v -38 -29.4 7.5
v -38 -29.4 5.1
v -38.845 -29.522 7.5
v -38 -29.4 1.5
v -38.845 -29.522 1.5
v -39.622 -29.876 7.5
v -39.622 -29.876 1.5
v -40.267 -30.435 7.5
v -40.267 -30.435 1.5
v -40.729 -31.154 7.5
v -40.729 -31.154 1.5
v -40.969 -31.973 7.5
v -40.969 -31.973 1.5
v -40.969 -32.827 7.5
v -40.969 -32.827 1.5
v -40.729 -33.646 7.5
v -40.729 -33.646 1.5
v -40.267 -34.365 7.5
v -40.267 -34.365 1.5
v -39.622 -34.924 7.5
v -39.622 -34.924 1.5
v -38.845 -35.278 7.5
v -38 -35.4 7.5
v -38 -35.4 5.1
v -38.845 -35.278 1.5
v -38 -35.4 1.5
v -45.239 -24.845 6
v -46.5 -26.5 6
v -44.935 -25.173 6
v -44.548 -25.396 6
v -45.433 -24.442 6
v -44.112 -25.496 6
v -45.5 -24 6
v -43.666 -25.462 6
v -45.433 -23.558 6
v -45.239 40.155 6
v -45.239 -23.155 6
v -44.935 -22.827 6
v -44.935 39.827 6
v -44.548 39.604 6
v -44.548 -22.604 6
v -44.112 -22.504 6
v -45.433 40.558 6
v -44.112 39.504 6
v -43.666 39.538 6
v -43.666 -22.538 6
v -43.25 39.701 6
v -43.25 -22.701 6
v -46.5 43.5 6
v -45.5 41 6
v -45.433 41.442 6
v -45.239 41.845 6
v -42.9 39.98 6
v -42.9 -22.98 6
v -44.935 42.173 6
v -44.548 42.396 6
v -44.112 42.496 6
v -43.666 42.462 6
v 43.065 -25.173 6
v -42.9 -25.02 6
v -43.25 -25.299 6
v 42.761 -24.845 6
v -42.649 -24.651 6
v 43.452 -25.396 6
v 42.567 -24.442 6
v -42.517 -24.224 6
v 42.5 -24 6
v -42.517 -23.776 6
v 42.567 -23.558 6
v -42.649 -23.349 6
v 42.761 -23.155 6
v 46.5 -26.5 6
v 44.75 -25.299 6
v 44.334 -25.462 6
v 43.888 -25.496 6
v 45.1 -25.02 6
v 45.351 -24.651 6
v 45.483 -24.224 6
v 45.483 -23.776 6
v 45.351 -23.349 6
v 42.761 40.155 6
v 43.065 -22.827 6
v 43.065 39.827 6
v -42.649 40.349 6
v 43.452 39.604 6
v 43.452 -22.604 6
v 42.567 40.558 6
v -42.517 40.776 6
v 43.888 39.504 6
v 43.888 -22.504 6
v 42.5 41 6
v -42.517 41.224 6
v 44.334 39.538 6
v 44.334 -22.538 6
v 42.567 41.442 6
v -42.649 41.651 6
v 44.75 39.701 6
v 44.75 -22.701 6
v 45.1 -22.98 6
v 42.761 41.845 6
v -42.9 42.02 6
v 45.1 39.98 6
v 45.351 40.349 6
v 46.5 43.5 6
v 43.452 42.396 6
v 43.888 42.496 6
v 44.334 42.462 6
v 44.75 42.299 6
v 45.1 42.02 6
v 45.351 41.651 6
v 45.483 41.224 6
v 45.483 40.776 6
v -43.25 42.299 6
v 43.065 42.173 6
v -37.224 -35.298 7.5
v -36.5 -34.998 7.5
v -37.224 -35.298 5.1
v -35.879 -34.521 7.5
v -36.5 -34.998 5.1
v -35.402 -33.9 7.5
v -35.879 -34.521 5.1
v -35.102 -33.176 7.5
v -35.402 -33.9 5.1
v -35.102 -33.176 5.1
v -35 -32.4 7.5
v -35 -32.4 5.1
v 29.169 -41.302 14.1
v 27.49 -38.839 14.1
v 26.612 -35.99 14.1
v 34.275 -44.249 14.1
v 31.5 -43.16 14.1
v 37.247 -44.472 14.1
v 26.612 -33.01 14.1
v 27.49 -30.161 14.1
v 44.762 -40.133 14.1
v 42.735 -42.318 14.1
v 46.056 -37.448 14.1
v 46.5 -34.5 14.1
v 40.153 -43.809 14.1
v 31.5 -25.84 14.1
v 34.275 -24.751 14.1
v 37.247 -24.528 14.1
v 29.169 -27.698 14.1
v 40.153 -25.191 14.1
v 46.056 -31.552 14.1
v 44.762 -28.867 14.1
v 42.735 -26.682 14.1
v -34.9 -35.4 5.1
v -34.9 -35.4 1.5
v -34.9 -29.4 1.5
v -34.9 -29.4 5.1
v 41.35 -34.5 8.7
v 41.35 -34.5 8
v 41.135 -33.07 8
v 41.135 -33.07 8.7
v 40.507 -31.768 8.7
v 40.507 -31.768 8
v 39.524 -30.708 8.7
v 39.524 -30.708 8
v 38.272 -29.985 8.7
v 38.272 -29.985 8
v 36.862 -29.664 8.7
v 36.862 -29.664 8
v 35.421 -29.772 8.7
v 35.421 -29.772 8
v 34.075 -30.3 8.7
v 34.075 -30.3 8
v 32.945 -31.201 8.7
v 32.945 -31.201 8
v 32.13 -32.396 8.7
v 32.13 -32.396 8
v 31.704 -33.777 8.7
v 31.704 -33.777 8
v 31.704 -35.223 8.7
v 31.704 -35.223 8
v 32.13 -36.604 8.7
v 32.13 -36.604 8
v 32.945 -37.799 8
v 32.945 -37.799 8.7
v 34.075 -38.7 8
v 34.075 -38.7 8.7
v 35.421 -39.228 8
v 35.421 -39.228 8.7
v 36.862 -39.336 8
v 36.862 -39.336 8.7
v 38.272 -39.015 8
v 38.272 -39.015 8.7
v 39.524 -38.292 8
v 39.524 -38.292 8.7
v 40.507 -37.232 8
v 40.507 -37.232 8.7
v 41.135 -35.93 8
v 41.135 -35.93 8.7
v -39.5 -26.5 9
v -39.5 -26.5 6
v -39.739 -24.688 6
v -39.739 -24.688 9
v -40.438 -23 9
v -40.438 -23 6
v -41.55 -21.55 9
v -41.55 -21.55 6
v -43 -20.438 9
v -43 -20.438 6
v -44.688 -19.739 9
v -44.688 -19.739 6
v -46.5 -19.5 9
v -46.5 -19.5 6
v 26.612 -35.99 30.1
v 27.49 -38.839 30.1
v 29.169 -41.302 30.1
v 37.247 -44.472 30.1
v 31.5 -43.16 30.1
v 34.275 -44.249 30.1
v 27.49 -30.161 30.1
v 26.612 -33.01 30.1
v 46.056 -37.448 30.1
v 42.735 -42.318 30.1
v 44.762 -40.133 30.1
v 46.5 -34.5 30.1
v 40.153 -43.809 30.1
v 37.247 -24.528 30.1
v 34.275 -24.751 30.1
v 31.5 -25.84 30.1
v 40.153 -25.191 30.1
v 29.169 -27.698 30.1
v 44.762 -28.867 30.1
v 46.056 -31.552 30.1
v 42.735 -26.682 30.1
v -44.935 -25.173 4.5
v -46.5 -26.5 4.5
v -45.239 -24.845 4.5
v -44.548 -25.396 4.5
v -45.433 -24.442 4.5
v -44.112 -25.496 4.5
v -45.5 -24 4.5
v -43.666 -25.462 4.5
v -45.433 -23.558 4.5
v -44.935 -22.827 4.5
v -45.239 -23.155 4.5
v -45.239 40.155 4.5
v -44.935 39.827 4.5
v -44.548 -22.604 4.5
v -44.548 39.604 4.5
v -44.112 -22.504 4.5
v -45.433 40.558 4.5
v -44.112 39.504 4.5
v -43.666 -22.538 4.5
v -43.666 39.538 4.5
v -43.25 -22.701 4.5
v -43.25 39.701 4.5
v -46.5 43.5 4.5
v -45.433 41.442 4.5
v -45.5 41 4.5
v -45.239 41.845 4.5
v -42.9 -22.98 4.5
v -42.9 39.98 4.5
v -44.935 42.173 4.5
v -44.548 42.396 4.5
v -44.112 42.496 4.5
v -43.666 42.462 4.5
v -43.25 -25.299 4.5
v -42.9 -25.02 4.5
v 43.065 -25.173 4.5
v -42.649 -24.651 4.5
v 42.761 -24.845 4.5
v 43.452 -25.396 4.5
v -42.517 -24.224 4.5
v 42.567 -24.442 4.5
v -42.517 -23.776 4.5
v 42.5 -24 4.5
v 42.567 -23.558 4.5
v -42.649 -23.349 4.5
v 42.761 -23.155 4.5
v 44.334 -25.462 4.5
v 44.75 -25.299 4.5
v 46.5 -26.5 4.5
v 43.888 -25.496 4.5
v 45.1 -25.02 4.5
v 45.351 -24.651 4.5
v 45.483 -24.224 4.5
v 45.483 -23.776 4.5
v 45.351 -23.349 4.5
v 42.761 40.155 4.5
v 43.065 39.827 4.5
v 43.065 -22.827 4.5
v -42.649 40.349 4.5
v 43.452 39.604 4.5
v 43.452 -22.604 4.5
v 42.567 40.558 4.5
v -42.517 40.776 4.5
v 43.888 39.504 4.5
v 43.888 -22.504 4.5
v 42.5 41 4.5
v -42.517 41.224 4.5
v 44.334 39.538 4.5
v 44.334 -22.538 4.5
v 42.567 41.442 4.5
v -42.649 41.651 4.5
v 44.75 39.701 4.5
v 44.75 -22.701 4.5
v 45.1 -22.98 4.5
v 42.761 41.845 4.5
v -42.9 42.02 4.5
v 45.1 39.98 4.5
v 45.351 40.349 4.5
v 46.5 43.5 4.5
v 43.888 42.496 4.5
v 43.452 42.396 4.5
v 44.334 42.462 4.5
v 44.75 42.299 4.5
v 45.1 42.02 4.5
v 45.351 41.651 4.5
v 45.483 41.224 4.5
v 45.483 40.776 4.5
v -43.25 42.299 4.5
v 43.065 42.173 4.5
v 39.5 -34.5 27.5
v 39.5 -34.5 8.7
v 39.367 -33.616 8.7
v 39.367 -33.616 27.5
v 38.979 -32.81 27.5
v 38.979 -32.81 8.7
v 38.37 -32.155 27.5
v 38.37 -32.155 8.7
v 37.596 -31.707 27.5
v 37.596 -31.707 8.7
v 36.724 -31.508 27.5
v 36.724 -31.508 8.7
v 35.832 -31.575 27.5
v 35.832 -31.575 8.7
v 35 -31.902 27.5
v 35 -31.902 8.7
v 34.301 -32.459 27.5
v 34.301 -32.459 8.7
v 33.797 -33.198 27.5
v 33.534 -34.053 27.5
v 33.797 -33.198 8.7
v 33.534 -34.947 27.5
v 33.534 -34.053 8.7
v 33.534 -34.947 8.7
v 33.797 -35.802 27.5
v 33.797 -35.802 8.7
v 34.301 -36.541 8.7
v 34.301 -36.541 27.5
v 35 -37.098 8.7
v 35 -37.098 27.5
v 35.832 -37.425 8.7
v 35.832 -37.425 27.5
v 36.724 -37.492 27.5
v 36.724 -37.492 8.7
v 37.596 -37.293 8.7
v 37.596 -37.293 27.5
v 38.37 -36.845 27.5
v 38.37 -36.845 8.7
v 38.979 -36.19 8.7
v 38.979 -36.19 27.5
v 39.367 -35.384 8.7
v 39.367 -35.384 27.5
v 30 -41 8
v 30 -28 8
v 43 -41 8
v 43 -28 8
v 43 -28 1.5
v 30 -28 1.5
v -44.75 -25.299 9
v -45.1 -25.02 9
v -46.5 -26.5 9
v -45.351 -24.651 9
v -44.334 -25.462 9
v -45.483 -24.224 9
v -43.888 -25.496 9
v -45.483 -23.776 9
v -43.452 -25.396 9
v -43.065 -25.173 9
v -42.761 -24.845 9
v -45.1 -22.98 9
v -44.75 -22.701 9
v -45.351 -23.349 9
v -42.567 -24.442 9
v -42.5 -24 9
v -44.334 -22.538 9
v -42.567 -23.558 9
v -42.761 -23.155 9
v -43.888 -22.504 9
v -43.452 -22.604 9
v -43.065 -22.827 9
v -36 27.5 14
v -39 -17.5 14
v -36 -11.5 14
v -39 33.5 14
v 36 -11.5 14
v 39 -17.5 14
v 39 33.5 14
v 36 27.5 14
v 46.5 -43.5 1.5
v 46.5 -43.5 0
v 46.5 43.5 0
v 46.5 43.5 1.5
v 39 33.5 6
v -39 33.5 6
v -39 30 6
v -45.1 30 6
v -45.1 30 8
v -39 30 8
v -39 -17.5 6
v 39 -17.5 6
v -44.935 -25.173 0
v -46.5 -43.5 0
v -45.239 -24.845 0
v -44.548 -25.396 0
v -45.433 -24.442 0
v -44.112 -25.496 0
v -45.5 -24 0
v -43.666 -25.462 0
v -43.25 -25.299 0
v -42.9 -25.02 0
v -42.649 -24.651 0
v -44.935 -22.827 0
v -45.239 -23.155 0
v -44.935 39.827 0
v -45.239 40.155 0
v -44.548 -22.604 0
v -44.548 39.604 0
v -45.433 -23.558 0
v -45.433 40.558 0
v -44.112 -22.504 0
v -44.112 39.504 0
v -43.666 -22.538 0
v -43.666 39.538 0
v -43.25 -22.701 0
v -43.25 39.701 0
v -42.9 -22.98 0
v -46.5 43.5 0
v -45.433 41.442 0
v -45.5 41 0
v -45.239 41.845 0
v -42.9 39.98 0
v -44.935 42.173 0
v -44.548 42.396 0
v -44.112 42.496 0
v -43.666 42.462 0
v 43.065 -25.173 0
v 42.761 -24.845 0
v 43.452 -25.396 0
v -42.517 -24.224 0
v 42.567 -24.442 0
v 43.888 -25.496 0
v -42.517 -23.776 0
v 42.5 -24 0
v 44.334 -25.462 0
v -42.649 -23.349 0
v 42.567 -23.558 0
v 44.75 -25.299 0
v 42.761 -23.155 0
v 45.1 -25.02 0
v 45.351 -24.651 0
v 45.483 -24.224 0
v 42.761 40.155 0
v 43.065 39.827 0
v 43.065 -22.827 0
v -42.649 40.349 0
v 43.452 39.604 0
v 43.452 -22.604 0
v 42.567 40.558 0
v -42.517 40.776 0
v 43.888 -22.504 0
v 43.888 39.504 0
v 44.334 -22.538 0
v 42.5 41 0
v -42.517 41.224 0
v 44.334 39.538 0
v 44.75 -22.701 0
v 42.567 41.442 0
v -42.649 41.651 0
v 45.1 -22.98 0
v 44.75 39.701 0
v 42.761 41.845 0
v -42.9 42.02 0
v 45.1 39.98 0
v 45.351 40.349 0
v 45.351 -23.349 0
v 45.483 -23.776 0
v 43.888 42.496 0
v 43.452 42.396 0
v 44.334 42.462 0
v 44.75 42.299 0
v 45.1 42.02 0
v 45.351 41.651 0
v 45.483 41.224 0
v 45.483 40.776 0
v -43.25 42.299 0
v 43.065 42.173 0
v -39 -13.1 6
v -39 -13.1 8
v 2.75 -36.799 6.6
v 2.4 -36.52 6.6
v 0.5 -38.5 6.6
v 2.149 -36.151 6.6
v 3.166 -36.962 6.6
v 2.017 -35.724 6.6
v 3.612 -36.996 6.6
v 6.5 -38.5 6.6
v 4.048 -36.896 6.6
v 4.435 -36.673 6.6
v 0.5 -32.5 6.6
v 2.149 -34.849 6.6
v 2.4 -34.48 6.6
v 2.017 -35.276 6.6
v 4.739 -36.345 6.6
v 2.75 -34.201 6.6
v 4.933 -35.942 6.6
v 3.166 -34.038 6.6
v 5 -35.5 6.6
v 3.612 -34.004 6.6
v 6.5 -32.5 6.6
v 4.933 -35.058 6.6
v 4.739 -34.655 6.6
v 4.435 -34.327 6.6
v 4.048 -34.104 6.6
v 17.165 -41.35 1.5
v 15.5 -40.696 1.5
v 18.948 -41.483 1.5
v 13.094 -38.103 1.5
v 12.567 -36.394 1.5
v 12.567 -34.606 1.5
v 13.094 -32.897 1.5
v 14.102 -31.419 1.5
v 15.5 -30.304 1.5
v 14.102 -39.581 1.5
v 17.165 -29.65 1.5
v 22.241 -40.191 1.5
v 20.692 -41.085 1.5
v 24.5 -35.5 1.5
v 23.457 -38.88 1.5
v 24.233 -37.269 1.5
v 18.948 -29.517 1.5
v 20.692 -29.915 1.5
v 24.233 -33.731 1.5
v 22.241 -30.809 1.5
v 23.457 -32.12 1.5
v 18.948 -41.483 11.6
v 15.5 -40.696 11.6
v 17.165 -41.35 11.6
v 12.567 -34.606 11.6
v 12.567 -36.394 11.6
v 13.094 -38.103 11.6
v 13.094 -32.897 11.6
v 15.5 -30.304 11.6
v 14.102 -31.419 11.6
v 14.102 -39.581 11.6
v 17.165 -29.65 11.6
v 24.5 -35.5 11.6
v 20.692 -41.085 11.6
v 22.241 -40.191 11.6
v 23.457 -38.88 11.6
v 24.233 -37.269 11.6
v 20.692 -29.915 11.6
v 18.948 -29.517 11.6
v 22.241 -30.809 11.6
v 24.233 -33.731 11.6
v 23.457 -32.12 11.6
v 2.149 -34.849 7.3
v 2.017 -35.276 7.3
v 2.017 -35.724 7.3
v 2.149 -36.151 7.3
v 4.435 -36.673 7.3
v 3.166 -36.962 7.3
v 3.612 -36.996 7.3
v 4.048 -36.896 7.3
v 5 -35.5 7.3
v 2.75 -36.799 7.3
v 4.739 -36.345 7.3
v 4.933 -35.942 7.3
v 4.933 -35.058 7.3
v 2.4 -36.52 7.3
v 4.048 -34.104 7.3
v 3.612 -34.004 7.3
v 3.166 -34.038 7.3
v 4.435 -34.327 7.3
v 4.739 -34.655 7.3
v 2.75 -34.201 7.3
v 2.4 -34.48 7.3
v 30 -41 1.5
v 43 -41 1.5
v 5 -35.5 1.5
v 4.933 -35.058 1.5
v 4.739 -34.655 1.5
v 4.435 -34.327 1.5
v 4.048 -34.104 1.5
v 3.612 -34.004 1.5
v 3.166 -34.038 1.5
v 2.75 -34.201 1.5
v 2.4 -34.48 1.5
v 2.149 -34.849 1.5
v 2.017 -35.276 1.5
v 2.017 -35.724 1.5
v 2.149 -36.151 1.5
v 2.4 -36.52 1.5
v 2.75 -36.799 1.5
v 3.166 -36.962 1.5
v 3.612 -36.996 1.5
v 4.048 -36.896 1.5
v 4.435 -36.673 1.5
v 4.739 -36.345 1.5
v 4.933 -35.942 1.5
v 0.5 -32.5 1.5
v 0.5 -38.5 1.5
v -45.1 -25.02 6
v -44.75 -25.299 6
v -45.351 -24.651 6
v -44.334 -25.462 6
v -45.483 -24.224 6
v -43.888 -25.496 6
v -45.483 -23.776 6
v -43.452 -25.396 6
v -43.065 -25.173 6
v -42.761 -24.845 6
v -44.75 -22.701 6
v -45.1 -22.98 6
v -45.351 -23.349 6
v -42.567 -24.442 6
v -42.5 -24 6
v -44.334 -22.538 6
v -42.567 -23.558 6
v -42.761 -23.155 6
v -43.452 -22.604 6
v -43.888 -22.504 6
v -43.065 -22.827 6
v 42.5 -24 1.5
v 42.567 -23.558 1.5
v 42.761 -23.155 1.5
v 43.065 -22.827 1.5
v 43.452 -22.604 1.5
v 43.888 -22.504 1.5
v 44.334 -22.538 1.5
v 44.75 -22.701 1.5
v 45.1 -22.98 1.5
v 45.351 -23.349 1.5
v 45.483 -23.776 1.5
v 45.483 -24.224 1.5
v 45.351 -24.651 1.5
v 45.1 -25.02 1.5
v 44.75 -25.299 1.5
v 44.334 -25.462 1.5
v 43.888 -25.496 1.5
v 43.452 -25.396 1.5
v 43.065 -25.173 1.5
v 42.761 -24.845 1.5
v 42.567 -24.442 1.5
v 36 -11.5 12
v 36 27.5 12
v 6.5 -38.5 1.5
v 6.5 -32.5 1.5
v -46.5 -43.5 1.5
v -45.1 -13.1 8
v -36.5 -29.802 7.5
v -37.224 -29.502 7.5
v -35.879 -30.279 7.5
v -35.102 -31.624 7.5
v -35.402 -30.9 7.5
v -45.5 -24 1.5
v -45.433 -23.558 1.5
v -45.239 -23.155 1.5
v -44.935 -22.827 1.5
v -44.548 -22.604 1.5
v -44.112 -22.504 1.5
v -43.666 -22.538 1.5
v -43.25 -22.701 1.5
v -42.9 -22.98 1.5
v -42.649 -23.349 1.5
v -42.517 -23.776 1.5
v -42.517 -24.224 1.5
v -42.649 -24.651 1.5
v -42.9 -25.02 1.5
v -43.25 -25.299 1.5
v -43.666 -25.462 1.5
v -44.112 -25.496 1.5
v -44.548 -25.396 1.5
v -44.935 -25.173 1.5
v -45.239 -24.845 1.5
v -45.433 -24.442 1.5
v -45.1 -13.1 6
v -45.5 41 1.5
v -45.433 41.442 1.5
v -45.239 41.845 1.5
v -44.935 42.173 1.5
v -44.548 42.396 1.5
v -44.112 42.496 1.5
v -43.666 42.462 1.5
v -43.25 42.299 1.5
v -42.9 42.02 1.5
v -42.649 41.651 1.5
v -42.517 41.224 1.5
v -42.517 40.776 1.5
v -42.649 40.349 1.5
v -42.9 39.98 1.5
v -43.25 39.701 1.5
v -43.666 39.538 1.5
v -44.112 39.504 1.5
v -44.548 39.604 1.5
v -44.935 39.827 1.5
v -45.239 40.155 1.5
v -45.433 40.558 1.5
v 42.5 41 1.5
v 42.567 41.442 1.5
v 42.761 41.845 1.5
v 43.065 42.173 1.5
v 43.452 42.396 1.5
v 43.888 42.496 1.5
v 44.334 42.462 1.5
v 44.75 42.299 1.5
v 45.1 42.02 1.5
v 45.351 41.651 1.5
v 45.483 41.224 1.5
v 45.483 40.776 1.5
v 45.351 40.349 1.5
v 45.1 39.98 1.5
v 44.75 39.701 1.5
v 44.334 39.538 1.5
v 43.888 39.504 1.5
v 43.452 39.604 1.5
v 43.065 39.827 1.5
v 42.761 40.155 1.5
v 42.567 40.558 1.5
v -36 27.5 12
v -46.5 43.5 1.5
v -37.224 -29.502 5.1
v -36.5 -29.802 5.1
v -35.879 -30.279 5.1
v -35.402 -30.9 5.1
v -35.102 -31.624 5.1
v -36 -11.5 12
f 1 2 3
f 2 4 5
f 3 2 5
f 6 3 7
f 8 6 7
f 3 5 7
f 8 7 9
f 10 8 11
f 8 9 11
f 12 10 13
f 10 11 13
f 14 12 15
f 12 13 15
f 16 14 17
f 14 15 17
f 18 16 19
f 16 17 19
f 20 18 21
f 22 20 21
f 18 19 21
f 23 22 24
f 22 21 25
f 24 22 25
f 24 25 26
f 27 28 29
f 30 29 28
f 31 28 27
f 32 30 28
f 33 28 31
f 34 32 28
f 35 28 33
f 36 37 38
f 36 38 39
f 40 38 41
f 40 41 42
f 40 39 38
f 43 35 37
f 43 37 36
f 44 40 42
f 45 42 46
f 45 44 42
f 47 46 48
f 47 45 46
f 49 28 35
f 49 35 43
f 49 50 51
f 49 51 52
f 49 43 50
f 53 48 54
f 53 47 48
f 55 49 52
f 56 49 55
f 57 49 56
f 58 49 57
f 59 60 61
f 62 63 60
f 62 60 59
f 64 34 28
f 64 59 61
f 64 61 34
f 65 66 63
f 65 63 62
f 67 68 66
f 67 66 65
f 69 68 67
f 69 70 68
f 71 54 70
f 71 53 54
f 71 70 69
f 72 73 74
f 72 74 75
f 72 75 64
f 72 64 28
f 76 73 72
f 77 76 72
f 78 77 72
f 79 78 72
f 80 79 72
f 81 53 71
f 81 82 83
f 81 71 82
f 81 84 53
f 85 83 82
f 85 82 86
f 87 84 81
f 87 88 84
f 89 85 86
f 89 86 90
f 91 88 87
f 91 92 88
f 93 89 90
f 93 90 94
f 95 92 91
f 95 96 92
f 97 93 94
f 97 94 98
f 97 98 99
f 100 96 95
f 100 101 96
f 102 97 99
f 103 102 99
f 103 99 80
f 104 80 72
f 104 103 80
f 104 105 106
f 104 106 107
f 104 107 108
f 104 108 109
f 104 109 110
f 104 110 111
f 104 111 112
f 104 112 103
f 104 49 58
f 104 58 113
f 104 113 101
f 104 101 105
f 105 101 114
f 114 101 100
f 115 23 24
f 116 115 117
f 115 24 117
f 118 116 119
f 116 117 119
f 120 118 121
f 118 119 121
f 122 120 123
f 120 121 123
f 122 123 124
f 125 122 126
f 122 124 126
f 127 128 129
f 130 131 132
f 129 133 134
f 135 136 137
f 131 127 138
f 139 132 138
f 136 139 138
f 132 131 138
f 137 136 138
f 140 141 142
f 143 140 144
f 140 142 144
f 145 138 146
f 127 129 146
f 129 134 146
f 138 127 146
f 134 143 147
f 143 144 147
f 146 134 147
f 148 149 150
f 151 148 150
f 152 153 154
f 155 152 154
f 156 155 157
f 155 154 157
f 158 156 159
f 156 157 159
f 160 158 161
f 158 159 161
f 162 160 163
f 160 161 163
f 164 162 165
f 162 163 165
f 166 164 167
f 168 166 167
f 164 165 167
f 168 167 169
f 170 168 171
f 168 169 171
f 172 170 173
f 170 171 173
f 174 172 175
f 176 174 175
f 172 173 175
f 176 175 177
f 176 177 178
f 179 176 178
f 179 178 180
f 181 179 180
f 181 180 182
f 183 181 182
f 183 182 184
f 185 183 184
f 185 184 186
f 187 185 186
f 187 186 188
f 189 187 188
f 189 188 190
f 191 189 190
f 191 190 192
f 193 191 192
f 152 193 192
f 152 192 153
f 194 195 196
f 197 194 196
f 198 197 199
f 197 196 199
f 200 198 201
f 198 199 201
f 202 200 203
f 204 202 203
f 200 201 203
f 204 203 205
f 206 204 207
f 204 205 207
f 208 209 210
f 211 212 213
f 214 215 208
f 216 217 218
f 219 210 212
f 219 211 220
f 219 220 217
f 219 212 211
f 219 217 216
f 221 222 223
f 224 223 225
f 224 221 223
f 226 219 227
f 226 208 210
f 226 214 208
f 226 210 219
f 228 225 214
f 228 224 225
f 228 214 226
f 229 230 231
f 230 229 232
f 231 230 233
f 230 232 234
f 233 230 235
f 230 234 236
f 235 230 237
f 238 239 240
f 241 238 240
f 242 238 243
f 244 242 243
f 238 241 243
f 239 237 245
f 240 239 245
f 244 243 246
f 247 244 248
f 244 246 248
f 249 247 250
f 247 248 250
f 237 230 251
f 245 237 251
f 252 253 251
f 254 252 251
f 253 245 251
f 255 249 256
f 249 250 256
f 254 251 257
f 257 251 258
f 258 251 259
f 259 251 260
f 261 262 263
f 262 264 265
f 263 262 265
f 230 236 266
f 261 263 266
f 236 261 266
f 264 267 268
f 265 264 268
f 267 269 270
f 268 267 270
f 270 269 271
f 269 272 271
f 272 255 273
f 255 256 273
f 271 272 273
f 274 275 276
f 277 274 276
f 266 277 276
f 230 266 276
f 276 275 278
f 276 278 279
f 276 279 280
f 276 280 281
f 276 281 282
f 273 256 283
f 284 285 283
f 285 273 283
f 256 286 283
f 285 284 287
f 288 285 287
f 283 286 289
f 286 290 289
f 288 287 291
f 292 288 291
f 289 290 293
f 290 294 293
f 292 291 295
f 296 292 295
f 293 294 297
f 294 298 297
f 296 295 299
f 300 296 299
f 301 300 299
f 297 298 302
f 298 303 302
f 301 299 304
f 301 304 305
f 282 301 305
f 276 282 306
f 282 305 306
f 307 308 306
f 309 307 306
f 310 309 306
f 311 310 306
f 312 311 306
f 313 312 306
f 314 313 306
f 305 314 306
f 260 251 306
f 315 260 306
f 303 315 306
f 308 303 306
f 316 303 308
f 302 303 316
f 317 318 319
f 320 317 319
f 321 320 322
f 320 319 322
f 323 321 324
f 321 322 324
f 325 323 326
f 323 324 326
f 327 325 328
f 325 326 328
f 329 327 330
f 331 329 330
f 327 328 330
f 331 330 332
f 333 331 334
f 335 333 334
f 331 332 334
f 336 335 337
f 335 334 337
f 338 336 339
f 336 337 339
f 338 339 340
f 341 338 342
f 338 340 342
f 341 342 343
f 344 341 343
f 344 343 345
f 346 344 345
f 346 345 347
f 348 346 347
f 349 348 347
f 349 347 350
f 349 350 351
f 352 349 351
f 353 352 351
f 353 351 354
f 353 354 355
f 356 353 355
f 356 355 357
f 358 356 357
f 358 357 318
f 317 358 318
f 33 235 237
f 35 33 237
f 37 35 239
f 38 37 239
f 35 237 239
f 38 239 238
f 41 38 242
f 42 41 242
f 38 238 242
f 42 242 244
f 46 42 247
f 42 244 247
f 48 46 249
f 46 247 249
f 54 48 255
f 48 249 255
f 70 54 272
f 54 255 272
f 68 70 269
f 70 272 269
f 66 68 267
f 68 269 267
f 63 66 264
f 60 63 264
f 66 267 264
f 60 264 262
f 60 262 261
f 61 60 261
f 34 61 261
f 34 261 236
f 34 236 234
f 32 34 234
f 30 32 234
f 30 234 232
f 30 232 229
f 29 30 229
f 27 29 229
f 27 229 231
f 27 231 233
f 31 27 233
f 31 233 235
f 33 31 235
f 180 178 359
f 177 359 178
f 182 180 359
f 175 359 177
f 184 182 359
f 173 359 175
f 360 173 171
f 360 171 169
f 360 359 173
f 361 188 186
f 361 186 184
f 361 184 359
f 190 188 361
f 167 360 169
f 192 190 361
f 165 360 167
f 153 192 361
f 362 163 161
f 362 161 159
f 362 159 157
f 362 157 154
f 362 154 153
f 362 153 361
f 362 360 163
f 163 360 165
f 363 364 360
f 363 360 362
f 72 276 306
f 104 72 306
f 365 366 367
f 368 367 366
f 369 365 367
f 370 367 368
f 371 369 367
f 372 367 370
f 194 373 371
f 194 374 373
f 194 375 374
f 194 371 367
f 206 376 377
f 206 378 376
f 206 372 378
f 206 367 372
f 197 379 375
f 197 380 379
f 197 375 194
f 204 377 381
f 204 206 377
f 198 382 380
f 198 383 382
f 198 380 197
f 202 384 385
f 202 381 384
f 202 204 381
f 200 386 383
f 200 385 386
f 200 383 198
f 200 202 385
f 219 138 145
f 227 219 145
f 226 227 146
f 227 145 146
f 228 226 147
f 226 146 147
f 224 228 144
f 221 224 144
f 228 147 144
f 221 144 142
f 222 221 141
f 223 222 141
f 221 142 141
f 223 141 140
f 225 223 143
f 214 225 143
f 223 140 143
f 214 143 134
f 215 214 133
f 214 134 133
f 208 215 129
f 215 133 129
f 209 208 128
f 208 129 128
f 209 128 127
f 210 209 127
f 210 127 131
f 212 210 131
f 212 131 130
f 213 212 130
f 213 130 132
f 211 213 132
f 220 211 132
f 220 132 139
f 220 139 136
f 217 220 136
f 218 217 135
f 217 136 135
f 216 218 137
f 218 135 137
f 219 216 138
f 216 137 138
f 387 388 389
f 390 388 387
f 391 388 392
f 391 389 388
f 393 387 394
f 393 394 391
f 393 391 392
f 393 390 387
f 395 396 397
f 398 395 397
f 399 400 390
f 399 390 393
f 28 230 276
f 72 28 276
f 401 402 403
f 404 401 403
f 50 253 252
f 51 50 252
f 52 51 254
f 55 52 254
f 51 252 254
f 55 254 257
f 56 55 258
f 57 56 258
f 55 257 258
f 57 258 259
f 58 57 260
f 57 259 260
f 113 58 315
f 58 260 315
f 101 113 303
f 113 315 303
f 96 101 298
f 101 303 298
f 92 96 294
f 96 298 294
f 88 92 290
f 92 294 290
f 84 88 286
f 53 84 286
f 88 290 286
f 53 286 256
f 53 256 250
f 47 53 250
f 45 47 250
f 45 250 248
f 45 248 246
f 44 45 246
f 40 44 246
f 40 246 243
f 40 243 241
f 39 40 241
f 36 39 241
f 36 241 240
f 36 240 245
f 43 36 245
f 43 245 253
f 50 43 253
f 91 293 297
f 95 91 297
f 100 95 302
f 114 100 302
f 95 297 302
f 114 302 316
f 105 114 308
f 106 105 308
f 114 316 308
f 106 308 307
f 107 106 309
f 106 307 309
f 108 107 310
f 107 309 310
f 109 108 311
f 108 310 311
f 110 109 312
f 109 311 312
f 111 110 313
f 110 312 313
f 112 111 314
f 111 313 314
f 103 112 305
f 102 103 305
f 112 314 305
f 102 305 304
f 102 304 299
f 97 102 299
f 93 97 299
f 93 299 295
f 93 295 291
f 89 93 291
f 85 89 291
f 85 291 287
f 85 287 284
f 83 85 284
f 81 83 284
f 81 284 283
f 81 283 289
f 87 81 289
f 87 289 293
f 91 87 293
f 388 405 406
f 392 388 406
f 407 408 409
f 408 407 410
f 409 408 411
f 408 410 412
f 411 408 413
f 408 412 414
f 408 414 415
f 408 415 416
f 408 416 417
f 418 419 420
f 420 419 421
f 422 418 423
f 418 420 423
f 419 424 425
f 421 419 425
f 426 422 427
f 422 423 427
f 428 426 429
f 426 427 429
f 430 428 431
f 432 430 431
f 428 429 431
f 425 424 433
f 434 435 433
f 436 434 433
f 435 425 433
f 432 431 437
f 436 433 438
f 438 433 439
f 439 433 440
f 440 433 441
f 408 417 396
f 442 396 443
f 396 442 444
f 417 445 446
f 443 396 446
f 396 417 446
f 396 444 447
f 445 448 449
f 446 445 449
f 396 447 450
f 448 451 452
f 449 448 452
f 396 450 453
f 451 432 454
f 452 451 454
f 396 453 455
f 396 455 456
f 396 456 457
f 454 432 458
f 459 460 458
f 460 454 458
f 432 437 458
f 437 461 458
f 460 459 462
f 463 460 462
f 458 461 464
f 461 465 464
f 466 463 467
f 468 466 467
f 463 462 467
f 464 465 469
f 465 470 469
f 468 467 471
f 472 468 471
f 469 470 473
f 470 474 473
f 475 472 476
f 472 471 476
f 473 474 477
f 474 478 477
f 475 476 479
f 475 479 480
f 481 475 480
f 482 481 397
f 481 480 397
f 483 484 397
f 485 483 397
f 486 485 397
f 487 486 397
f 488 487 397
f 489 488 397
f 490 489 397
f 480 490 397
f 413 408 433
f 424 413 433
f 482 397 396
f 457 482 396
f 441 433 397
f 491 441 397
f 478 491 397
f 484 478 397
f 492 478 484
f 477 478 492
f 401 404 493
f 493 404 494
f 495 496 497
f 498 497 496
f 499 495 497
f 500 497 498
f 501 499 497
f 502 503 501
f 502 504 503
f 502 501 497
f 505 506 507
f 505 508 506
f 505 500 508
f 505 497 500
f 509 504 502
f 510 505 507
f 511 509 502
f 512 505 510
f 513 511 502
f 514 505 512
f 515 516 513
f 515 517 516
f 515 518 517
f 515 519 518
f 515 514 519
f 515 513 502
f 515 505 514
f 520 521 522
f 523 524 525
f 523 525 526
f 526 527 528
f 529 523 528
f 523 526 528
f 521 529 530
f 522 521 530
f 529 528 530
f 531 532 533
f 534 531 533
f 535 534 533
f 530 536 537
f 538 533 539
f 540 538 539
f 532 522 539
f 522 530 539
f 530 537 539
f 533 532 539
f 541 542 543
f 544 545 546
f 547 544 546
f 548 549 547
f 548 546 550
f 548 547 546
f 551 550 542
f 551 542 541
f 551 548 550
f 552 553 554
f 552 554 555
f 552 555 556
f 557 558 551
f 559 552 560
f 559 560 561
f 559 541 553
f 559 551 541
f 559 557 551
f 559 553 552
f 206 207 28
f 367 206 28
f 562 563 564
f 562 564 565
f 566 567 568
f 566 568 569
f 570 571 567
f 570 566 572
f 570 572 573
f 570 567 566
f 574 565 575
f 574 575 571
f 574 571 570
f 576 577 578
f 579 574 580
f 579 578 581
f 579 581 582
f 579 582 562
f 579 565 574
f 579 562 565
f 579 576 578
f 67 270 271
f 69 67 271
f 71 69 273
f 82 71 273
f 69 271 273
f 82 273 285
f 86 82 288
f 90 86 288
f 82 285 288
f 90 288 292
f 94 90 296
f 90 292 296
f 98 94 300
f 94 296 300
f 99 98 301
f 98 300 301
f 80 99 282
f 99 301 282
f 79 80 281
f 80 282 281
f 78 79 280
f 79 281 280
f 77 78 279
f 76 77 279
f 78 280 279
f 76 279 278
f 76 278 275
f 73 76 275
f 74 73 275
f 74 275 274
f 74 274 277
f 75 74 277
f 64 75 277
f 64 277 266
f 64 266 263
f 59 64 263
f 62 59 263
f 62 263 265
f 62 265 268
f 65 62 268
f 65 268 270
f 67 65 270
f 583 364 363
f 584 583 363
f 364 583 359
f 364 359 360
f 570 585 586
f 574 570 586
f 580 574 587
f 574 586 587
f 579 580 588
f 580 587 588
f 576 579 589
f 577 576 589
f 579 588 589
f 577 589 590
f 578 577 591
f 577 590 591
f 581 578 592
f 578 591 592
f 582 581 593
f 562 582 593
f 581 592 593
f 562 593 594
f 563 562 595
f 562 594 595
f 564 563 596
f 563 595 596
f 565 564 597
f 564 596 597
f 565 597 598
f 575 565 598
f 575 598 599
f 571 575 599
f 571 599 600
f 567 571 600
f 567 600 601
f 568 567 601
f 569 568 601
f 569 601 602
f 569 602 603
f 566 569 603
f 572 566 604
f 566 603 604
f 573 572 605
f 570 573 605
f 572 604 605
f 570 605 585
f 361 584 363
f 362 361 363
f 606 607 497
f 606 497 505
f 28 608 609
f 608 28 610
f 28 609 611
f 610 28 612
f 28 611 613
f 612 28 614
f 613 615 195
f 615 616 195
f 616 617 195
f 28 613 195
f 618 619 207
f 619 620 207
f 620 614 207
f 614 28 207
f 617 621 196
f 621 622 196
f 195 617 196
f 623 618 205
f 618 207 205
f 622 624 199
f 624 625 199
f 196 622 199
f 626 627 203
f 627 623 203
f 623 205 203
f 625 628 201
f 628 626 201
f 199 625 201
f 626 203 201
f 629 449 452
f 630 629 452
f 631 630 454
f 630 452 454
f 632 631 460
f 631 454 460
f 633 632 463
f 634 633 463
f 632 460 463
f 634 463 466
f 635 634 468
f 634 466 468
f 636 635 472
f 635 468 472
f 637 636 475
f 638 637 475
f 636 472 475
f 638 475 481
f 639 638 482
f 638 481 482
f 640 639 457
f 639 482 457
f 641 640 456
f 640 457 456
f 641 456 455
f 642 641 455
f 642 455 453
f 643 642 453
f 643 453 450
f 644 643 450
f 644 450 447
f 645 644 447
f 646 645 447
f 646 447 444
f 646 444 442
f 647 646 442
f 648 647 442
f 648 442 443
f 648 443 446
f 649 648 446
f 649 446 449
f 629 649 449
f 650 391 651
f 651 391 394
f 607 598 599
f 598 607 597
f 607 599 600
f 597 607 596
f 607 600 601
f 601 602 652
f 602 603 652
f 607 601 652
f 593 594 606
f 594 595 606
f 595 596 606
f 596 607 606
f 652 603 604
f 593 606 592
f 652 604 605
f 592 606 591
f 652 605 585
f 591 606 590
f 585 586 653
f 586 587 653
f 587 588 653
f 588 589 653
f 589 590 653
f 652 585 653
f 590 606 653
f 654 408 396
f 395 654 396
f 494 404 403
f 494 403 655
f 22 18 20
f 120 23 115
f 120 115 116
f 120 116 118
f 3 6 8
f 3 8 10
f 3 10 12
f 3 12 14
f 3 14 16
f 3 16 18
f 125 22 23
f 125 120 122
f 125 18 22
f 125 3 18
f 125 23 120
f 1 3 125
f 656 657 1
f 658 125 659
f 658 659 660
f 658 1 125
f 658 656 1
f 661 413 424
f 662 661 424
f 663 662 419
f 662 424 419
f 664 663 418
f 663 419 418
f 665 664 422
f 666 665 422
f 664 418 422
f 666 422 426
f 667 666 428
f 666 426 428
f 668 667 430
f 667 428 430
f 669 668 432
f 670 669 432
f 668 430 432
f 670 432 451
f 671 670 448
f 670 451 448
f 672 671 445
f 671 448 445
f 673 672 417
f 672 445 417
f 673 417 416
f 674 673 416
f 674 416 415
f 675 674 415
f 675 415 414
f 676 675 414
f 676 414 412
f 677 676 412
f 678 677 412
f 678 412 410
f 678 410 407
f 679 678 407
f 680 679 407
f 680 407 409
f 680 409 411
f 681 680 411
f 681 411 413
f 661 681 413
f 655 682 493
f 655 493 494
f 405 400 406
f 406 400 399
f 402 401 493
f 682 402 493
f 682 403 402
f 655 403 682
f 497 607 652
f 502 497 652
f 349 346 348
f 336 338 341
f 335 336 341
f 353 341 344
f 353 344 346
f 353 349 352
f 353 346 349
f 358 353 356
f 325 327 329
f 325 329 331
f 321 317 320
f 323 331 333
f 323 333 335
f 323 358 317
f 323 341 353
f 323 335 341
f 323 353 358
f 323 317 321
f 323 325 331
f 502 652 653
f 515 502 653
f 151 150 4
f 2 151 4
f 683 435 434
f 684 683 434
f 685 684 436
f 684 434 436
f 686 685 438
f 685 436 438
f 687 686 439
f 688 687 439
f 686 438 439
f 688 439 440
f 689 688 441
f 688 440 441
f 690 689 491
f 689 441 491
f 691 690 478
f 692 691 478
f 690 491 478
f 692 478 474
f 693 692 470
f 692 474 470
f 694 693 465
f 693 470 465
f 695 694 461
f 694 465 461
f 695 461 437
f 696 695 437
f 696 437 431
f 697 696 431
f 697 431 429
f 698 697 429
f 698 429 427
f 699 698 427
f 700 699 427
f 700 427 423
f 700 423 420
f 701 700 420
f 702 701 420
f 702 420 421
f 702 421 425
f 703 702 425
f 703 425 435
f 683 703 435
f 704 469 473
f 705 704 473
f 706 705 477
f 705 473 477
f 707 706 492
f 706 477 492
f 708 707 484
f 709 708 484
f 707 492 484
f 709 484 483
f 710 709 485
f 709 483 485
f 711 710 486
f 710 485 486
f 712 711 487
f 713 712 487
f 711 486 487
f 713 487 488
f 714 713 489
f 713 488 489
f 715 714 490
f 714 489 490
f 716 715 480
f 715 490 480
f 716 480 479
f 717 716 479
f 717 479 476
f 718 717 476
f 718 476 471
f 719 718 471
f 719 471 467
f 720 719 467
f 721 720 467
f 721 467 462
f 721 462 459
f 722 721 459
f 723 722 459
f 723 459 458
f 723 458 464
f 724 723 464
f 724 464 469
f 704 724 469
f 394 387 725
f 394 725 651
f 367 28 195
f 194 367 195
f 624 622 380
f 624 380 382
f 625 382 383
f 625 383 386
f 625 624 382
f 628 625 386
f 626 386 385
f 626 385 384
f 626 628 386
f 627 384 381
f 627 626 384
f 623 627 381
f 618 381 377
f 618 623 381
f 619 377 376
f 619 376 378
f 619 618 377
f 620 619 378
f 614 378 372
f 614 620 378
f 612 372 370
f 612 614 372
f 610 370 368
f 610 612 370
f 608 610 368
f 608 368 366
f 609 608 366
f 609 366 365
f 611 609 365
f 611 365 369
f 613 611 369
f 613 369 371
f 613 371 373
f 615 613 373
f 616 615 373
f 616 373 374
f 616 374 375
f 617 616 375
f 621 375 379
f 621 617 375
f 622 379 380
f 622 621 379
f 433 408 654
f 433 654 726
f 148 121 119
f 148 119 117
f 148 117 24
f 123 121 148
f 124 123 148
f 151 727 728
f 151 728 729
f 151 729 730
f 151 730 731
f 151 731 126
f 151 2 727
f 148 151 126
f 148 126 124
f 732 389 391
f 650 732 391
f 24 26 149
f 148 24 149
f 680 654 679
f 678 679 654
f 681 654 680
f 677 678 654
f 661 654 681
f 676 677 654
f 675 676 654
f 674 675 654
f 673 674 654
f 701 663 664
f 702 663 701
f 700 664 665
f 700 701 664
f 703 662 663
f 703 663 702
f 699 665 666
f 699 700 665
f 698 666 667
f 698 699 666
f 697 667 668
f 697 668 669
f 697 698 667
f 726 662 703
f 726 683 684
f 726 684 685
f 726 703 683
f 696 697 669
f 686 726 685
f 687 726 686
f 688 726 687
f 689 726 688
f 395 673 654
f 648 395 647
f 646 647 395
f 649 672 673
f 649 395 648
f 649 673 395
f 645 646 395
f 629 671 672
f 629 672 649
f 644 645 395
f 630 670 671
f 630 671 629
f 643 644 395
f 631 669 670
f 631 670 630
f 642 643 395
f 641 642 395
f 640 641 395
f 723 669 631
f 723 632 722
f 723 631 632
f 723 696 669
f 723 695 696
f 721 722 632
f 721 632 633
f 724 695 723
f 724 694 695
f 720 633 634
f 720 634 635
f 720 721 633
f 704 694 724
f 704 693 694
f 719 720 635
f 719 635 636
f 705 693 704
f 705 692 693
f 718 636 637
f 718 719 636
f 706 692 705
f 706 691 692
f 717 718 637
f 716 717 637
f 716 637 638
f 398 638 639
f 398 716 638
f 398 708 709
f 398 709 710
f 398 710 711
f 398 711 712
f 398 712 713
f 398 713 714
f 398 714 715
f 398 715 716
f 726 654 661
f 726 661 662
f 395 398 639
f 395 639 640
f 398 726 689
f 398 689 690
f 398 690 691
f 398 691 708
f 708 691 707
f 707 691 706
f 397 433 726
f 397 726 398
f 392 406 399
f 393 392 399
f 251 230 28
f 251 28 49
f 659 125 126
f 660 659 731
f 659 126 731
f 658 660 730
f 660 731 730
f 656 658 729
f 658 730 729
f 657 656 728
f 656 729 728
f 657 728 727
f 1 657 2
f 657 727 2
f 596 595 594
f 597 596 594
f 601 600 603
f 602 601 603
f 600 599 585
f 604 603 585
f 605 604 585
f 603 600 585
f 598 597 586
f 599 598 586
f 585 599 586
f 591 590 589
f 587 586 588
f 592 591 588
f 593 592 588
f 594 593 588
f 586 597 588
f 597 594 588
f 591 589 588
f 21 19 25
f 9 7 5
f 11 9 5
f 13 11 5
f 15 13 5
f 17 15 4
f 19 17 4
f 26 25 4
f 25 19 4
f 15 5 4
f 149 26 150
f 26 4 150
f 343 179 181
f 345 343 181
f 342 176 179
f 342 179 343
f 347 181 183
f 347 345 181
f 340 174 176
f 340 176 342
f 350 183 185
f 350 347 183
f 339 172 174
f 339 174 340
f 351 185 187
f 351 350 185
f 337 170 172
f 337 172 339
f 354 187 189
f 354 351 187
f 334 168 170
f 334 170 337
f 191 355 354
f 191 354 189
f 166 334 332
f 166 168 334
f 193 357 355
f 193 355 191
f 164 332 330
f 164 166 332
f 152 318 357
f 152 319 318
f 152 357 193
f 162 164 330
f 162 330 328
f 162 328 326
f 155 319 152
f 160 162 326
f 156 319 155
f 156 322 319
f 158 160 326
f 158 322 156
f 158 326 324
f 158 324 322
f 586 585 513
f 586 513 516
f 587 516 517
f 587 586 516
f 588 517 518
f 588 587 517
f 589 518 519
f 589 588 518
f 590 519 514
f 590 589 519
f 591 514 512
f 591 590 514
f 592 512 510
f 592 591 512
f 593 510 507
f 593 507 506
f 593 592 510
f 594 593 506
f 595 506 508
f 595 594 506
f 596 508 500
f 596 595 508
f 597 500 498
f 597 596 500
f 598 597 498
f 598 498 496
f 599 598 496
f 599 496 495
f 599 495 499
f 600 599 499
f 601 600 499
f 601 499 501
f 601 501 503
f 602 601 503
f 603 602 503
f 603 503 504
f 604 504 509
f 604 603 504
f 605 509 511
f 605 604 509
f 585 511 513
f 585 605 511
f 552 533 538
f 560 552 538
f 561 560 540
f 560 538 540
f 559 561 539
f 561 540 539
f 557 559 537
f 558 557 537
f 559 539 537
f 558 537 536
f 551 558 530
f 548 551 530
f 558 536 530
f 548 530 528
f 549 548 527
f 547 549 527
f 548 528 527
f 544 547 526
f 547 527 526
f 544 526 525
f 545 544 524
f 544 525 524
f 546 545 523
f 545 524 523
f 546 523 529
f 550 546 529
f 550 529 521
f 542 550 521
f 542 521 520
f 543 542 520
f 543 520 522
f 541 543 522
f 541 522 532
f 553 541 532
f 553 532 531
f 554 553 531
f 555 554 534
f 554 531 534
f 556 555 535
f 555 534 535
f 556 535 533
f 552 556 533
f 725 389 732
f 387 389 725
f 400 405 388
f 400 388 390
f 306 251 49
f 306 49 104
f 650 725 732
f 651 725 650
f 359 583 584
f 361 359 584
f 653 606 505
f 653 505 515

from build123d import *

# Parameters (mm, degrees)
F0_W      = 93
F0_H      = 87
F1_DEPTH  = 1.5
F3_W      = 93
F3_H      = 70
F4_DEPTH  = 1.5
F5_W      = 78
F5_H      = 51
F6_DEPTH  = 8
F7_W      = 72
F7_H      = 39
F8_DEPTH  = 2
F9_W      = 43.1
F9_H      = 2
F10_DEPTH = 6.1
F12_D     = 3
F12_2_D   = 3
F14_DEPTH = 3.6
F15_DEPTH = 6
F13_R     = 1.5
F16_DEPTH = 5.8
F13_W     = 6
F13_H     = 6
F17_DEPTH = 5.1
F13_R_2   = 6
F18_DEPTH = 10.1
F13_W_2   = 13
F13_H_2   = 13
F13_R_3   = 4.85
F13_R_4   = 3
F19_DEPTH = 6.5
F20_DEPTH = 7.2
F21_DEPTH = 26
F23_R     = 10
F24_DEPTH = 16
F25_R     = 1.5
F26_DEPTH = 3


with BuildPart() as f1:
    # F0 (on Top) → F1 (new body)
    with BuildSketch(Plane.XY):
        Rectangle(F0_W, F0_H)
    extrude(amount=F1_DEPTH)

    # F12 (through all)
    with Locations(Plane.XY.offset(6)):
        with Locations((-44, 41), (44, 41), (44, -24), (-44, -24)):
            Hole(F12_D / 2)


with BuildPart() as f4:
    # F3 (on offset) → F4 (new body)
    with BuildSketch(Plane.XY.offset(4.5)):
        with Locations((0, 8.5)):
            Rectangle(F3_W, F3_H)
    extrude(amount=F4_DEPTH)

    # F12#2 (through all)
    with Locations(Plane.XY.offset(6)):
        with Locations((-44, 41), (44, 41), (44, -24), (-44, -24)):
            Hole(F12_2_D / 2)


with BuildPart() as f6:
    # F5 (on face) → F6 (new body)
    with BuildSketch(Plane.XY.offset(6)):
        with Locations((0, 8)):
            Rectangle(F5_W, F5_H)
    extrude(amount=F6_DEPTH)

    # F7 (on face) → F8 (cut)
    with BuildSketch(Plane.XY.offset(14)):
        with Locations((0, 8)):
            Rectangle(F7_W, F7_H)
    extrude(amount=-F8_DEPTH, mode=Mode.SUBTRACT)


with BuildPart() as f10:
    # F9 (on face) → F10 (new body)
    with BuildSketch(Plane(origin=(-39, 0, 0), x_dir=(0, -1, 0), z_dir=(-1, 0, 0))):
        with Locations((-8.45, 7)):
            Rectangle(F9_W, F9_H)
    extrude(amount=F10_DEPTH)


with BuildPart() as f14:
    # F13 (on face) → F14 (new body)
    with BuildSketch(Plane.XY.offset(1.5)):
        with BuildLine():
            ThreePointArc((-38, -35.4), (-35.8786796564, -34.5213203436), (-35, -32.4))
            ThreePointArc((-35, -32.4), (-35.8786796564, -30.2786796564), (-38, -29.4))
            Line((-38, -29.4), (-38, -35.4))
        make_face()
        with BuildLine():
            ThreePointArc((-38, -29.4), (-35.8786796564, -30.2786796564), (-35, -32.4))
            ThreePointArc((-35, -32.4), (-35.8786796564, -34.5213203436), (-38, -35.4))
            Line((-38, -35.4), (-34.9, -35.4))
            Line((-34.9, -35.4), (-34.9, -29.4))
            Line((-34.9, -29.4), (-38, -29.4))
        make_face()
    extrude(amount=F14_DEPTH)

    # F13 (on face) → F15 (join)
    with BuildSketch(Plane.XY.offset(1.5)):
        with BuildLine():
            Line((-38, -35.4), (-38, -29.4))
            ThreePointArc((-38, -29.4), (-41, -32.4), (-38, -35.4))
        make_face()
        with BuildLine():
            ThreePointArc((-38, -35.4), (-35.8786796564, -34.5213203436), (-35, -32.4))
            ThreePointArc((-35, -32.4), (-35.8786796564, -30.2786796564), (-38, -29.4))
            Line((-38, -29.4), (-38, -35.4))
        make_face()
    extrude(amount=F15_DEPTH)


with BuildPart() as f16:
    # F13 (on face) → F16 (new body)
    with BuildSketch(Plane.XY.offset(1.5)):
        with Locations((3.5, -35.5)):
            Circle(F13_R)
    extrude(amount=F16_DEPTH)


with BuildPart() as f17:
    # F13 (on face) → F17 (new body)
    with BuildSketch(Plane.XY.offset(1.5)):
        with Locations((3.5, -35.5)):
            Rectangle(F13_W, F13_H)
        with Locations((3.5, -35.5)):
            Circle(F13_R, mode=Mode.SUBTRACT)
    extrude(amount=F17_DEPTH)


with BuildPart() as f18:
    # F13 (on face) → F18 (new body)
    with BuildSketch(Plane.XY.offset(1.5)):
        with Locations((18.5, -35.5)):
            Circle(F13_R_2)
    extrude(amount=F18_DEPTH)


with BuildPart() as f19:
    # F13 (on face) → F19 (new body)
    with BuildSketch(Plane.XY.offset(1.5)):
        with Locations((36.5, -34.5)):
            Rectangle(F13_W_2, F13_H_2)
        with Locations((36.5, -34.5)):
            Circle(F13_R_3, mode=Mode.SUBTRACT)
        with Locations((36.5, -34.5)):
            Circle(F13_R_3)
        with Locations((36.5, -34.5)):
            Circle(F13_R_4, mode=Mode.SUBTRACT)
        with Locations((36.5, -34.5)):
            Circle(F13_R_4)
    extrude(amount=F19_DEPTH)

    # F13 (on face) → F20 (join)
    with BuildSketch(Plane.XY.offset(1.5)):
        with Locations((36.5, -34.5)):
            Circle(F13_R_3)
        with Locations((36.5, -34.5)):
            Circle(F13_R_4, mode=Mode.SUBTRACT)
        with Locations((36.5, -34.5)):
            Circle(F13_R_4)
    extrude(amount=F20_DEPTH)

    # F13 (on face) → F21 (join)
    with BuildSketch(Plane.XY.offset(1.5)):
        with Locations((36.5, -34.5)):
            Circle(F13_R_4)
    extrude(amount=F21_DEPTH)


with BuildPart() as f24:
    # F23 (on offset) → F24 (new body)
    with BuildSketch(Plane.XY.offset(14.1)):
        with Locations((36.5, -34.5)):
            Circle(F23_R)
    extrude(amount=F24_DEPTH)


with BuildPart() as f26:
    # F25 (on face) → F26 (new body)
    with BuildSketch(Plane.XY.offset(6)):
        with BuildLine():
            Line((-46.5, -19.5), (-46.5, -26.5))
            Line((-46.5, -26.5), (-39.5, -26.5))
            ThreePointArc((-39.5, -26.5), (-41.5502525317, -21.5502525317), (-46.5, -19.5))
        make_face()
        with Locations((-44, -24)):
            Circle(F25_R, mode=Mode.SUBTRACT)
    extrude(amount=F26_DEPTH)


solid = Compound([f1.part, f4.part, f6.part, f10.part, f14.part, f16.part, f17.part, f18.part, f19.part, f24.part, f26.part])
